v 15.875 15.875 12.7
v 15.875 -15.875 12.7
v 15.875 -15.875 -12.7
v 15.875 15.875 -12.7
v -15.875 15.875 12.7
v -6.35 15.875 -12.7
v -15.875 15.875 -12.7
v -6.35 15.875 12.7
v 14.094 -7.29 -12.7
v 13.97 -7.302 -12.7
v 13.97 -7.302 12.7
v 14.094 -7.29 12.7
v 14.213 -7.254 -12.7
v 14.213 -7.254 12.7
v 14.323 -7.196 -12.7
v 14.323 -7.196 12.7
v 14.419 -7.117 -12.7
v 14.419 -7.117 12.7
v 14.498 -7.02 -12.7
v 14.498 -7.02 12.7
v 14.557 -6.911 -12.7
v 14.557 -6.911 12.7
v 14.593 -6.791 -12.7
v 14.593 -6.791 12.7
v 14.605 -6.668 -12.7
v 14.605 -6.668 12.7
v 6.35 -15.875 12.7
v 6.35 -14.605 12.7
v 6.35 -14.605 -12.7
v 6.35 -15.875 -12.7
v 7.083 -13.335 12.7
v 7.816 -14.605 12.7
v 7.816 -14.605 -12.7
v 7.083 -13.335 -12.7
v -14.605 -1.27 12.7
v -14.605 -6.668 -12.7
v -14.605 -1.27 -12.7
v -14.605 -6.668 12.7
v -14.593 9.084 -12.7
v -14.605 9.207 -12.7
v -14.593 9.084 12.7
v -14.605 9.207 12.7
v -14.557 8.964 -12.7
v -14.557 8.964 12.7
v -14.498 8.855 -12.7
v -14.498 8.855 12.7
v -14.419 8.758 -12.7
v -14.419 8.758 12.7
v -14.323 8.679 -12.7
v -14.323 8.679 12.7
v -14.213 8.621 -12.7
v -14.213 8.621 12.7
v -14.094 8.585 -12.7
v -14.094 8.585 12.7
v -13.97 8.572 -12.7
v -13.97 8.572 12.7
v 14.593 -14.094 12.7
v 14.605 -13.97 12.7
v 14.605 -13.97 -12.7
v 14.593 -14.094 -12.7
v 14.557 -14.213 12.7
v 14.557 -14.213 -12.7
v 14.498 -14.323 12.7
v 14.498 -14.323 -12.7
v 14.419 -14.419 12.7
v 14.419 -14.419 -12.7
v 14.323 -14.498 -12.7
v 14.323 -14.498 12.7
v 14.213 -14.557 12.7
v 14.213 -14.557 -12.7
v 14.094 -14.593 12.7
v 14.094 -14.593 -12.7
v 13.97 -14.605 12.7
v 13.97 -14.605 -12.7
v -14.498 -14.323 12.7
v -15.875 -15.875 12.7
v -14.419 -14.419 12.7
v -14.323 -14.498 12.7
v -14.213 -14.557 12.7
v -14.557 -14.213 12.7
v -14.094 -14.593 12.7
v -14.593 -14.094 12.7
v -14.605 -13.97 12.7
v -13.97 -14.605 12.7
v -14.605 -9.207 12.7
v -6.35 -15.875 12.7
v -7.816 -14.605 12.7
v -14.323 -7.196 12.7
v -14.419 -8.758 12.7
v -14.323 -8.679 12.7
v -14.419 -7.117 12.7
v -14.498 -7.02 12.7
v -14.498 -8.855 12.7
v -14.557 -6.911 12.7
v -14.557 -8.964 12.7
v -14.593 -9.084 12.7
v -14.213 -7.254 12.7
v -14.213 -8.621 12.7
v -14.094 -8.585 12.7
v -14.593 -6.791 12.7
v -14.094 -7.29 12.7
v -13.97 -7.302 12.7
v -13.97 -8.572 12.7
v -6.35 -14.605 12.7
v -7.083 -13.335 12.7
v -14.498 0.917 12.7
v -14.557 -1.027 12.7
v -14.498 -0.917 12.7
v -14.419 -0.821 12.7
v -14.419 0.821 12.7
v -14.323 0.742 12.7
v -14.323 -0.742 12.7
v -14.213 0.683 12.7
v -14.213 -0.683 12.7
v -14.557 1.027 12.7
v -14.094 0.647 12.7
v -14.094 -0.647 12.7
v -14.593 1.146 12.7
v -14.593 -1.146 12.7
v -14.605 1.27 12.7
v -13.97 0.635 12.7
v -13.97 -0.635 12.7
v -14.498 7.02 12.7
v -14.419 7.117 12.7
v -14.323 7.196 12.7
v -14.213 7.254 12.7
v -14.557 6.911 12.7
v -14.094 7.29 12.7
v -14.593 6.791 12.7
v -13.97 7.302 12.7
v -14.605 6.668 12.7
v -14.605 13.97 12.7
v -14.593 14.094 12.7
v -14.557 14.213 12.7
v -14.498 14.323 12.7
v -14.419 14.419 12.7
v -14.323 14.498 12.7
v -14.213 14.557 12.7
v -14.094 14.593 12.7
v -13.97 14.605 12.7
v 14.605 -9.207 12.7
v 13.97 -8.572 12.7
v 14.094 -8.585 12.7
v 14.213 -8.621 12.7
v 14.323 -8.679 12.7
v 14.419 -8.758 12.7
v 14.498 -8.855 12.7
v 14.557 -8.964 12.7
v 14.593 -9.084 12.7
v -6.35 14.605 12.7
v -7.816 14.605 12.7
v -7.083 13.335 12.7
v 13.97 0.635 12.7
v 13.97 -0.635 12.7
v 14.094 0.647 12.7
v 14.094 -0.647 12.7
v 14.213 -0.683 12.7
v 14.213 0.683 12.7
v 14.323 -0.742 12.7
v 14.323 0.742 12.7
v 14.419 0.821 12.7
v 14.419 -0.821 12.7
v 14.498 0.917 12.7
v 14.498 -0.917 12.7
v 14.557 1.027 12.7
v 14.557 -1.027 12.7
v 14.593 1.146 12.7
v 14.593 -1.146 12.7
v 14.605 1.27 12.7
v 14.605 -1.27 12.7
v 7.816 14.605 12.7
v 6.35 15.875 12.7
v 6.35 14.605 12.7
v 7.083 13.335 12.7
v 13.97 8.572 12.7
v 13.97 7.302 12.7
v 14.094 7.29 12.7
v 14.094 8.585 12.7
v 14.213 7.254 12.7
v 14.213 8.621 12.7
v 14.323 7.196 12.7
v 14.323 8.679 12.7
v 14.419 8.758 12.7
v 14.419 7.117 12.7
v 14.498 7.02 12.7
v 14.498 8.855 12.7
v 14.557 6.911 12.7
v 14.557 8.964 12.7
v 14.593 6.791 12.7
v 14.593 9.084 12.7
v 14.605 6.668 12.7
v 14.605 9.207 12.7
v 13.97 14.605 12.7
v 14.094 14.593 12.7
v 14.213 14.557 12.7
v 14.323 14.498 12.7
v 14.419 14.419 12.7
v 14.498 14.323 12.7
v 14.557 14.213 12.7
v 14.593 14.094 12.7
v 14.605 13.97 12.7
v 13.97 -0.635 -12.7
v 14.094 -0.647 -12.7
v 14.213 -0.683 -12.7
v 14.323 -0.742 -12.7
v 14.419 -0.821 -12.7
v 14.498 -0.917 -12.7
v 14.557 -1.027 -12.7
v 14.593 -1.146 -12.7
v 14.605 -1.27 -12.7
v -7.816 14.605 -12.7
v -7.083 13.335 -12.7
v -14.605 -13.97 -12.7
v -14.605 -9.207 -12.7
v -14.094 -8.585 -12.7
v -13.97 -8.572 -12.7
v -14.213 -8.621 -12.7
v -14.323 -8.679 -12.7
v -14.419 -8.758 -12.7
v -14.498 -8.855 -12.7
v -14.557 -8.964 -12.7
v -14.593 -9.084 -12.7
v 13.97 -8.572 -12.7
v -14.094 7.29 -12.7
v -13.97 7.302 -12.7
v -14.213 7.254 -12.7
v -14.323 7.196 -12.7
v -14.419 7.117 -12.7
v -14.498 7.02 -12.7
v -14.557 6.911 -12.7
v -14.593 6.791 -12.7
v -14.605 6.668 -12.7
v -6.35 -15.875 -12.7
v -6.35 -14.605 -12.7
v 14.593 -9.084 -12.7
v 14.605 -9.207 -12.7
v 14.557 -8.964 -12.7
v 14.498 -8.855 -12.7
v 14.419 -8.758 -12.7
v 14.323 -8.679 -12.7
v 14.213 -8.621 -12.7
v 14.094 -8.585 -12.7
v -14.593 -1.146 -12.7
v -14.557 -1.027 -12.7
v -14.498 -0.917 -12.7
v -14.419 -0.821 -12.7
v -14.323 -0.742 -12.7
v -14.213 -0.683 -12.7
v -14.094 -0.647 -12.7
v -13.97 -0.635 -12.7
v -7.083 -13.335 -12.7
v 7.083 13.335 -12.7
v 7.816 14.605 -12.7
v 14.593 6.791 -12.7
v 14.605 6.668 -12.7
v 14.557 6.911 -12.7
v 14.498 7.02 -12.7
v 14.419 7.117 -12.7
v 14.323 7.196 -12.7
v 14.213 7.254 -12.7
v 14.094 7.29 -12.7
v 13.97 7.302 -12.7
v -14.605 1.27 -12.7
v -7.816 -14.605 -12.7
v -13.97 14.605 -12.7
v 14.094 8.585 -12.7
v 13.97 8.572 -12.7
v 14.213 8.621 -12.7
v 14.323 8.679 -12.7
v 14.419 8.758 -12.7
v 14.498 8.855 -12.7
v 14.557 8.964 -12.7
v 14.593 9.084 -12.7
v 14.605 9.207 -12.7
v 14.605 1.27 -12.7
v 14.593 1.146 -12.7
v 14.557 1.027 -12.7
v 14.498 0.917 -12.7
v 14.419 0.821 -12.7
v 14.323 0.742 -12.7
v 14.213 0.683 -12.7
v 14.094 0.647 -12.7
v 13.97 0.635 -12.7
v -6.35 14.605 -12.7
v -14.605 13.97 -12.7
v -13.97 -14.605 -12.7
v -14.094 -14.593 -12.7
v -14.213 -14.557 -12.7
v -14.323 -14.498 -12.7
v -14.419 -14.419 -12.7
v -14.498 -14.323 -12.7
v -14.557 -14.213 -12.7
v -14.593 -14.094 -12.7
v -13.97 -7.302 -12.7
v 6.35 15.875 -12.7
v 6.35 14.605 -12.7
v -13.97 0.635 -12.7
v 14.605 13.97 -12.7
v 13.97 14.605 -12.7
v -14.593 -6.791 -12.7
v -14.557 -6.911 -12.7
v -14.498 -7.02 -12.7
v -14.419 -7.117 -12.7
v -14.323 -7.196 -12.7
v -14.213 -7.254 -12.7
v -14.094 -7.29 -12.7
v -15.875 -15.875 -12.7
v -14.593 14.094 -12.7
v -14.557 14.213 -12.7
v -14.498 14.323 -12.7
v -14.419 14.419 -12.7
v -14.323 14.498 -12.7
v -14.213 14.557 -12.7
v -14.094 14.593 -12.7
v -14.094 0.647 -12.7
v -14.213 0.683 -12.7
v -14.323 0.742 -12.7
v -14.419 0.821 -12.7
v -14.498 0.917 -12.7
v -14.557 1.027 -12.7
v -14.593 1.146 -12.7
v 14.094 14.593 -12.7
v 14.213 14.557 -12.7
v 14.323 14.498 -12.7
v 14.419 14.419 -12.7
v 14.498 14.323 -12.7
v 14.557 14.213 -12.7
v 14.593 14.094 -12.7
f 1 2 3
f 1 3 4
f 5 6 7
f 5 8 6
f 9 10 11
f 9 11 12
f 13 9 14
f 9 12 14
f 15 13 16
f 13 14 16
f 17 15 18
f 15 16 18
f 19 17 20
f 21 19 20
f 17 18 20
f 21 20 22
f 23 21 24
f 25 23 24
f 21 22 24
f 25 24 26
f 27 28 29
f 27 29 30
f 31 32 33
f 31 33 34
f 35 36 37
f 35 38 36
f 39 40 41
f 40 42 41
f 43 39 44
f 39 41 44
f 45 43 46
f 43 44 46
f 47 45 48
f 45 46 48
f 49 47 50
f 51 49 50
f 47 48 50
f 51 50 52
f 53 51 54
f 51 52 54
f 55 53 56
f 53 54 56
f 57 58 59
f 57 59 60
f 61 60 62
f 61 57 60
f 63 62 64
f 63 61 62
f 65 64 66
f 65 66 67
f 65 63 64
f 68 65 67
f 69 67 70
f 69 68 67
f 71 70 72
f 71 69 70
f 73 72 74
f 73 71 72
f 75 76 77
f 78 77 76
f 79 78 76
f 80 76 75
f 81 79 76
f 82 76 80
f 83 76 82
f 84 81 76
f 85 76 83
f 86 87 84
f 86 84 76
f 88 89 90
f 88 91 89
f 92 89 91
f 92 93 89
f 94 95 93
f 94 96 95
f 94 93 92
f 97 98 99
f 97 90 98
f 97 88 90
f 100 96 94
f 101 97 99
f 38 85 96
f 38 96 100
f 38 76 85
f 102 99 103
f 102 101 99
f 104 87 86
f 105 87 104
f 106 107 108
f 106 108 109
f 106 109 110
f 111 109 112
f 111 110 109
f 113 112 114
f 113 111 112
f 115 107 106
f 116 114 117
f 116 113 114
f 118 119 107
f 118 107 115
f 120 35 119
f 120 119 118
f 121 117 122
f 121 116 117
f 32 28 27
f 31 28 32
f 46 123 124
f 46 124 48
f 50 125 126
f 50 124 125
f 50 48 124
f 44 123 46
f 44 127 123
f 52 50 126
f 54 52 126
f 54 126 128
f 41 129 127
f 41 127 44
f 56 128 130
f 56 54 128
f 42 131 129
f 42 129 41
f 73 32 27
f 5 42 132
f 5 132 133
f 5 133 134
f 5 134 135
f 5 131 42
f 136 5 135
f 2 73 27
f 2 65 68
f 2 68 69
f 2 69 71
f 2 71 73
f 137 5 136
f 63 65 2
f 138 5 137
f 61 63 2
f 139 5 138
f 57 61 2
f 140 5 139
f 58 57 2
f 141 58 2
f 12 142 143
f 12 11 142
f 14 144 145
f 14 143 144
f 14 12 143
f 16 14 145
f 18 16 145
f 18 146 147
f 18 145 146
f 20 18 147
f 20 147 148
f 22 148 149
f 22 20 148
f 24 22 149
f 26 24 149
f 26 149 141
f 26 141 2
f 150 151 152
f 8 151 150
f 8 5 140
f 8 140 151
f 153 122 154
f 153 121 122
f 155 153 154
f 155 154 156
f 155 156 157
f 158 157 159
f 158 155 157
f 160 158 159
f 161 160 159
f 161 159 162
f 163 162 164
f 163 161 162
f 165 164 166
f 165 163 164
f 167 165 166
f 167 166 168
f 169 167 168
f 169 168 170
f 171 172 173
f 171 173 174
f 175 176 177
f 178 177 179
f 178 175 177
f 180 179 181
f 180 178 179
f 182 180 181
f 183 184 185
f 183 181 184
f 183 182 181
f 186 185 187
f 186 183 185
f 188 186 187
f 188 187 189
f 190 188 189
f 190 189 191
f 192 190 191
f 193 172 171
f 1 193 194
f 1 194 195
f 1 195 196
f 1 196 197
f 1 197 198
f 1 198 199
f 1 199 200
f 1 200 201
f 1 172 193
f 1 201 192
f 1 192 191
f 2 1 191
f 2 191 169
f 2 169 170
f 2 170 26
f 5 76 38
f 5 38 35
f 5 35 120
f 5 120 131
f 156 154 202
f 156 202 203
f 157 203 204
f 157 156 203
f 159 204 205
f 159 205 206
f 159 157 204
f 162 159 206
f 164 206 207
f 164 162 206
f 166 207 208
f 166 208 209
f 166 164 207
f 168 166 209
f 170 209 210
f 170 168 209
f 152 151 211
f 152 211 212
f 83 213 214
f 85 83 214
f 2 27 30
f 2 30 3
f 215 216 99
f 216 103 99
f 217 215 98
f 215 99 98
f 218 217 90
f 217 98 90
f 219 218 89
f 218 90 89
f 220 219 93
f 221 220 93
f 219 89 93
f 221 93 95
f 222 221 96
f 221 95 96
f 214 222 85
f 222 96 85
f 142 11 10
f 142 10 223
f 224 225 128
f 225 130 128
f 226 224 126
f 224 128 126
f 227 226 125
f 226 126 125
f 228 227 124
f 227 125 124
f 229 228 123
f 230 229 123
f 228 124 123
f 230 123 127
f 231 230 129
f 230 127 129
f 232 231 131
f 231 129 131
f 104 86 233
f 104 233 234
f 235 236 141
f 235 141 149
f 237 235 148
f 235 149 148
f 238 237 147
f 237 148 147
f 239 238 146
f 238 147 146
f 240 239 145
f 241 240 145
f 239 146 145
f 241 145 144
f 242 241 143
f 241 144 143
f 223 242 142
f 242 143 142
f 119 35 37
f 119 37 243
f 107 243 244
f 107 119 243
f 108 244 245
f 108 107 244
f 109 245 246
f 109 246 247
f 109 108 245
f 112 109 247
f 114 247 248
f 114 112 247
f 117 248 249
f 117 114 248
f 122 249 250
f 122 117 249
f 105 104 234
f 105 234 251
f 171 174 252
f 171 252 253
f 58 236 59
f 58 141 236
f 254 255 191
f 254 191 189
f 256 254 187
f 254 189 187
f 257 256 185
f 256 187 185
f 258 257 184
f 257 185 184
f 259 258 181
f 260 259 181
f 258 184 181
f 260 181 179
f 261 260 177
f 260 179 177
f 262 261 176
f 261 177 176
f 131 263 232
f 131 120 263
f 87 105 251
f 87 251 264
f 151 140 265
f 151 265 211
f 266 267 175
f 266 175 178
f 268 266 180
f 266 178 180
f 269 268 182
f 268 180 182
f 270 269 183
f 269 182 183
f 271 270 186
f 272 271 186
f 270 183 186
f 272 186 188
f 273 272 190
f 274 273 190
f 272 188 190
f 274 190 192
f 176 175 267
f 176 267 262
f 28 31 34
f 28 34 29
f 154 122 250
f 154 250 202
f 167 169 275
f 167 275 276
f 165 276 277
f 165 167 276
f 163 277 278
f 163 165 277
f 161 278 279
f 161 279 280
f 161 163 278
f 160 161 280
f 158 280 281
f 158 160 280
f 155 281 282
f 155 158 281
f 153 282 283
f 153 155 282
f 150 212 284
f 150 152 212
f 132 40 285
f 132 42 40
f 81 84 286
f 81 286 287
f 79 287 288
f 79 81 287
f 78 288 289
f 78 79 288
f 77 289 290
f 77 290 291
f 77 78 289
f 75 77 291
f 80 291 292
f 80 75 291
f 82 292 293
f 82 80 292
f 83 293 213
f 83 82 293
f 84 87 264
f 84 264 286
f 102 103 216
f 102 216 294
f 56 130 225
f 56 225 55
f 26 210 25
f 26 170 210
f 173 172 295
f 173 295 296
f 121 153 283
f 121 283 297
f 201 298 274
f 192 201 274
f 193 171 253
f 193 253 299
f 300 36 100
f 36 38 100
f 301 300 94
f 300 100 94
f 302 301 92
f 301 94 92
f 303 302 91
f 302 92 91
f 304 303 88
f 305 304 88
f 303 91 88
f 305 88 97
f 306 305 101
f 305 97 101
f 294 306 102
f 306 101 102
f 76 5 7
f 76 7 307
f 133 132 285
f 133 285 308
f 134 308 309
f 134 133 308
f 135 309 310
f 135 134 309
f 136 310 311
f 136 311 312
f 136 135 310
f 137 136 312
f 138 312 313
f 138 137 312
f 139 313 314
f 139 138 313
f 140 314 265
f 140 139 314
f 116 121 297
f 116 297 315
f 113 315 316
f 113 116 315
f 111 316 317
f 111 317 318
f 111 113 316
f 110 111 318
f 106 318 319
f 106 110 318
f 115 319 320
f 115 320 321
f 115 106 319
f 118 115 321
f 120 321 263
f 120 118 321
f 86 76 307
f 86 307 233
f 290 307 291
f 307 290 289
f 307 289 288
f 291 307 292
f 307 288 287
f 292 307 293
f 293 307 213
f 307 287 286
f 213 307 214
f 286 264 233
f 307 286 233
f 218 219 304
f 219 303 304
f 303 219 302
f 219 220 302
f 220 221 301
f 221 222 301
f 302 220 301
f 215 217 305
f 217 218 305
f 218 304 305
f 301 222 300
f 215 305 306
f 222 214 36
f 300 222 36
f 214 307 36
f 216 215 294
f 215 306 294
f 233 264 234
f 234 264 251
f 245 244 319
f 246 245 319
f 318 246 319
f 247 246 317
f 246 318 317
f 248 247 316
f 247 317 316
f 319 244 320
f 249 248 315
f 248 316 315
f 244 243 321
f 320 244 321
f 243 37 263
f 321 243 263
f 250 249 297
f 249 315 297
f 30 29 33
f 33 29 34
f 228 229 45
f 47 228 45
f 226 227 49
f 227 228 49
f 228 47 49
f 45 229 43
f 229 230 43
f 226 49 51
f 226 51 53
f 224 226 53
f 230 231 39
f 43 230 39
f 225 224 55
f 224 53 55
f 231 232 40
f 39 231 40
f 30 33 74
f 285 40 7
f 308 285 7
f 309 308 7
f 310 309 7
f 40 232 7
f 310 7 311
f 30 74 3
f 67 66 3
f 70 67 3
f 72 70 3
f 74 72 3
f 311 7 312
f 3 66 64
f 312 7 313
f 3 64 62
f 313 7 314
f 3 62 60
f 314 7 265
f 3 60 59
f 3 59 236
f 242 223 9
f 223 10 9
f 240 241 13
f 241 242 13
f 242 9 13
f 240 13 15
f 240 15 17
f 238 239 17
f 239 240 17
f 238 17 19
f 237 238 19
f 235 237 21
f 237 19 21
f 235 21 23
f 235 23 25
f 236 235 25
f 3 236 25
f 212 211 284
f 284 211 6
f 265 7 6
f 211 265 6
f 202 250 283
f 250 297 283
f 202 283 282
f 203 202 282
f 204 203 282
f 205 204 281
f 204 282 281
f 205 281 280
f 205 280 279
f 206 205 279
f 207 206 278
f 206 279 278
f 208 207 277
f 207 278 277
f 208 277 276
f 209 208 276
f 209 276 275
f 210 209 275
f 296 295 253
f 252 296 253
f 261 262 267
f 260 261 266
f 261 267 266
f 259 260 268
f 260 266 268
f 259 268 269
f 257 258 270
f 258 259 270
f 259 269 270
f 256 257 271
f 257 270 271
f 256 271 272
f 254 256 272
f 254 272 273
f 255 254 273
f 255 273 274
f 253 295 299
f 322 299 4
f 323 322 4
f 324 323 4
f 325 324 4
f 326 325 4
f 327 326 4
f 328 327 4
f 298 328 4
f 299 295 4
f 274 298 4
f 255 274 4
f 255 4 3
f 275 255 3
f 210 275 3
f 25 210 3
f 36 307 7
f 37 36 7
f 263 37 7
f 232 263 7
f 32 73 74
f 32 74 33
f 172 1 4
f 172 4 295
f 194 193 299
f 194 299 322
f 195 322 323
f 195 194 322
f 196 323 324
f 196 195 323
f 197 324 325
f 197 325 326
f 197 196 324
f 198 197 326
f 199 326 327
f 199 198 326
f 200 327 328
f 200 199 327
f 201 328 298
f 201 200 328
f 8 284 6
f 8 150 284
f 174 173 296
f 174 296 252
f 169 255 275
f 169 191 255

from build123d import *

# Parameters (mm, degrees)
BASE_EXTRUDE_DEPTH = 12.7
FILLET1_R          = 0.635


with BuildPart() as part:
    # Sketch1 → Base-Extrude (new, symmetric)
    with BuildSketch(Plane.XY):
        with BuildLine():
            Line((-6.35, 15.875), (-15.875, 15.875))
            Line((-15.875, 15.875), (-15.875, -15.875))
            Line((-15.875, -15.875), (-6.35, -15.875))
            Line((-6.35, -15.875), (-6.35, -14.605))
            Line((-6.35, -14.605), (-7.083234843, -13.335))
            Line((-7.083234843, -13.335), (-7.816469684, -14.605))
            Line((-7.816469684, -14.605), (-13.97, -14.605))
            ThreePointArc((-13.97, -14.605), (-14.419012806, -14.419012806), (-14.605, -13.97))
            Line((-14.605, -13.97), (-14.605, -8.5725))
            Line((-14.605, -8.5725), (-13.97, -8.5725))
            Line((-13.97, -8.5725), (-13.97, -7.3025))
            Line((-13.97, -7.3025), (-14.605, -7.3025))
            Line((-14.605, -7.3025), (-14.605, -1.27))
            ThreePointArc((-14.605, -1.27), (-14.419012806, -0.820987194), (-13.97, -0.635))
            Line((-13.97, -0.635), (13.97, -0.635))
            ThreePointArc((13.97, -0.635), (14.419012806, -0.820987194), (14.605, -1.27))
            Line((14.605, -1.27), (14.605, -7.3025))
            Line((14.605, -7.3025), (13.97, -7.3025))
            Line((13.97, -7.3025), (13.97, -8.5725))
            Line((13.97, -8.5725), (14.605, -8.5725))
            Line((14.605, -8.5725), (14.605, -13.97))
            ThreePointArc((14.605, -13.97), (14.419012806, -14.419012806), (13.97, -14.605))
            Line((13.97, -14.605), (7.816469684, -14.605))
            Line((7.816469684, -14.605), (7.083234843, -13.335))
            Line((7.083234843, -13.335), (6.35, -14.605))
            Line((6.35, -14.605), (6.35, -15.875))
            Line((6.35, -15.875), (15.875, -15.875))
            Line((15.875, -15.875), (15.875, 15.875))
            Line((15.875, 15.875), (6.35, 15.875))
            Line((6.35, 15.875), (6.35, 14.605))
            Line((6.35, 14.605), (7.083234843, 13.335))
            Line((7.083234843, 13.335), (7.816469684, 14.605))
            Line((7.816469684, 14.605), (13.97, 14.605))
            ThreePointArc((13.97, 14.605), (14.419012806, 14.419012806), (14.605, 13.97))
            Line((14.605, 13.97), (14.605, 8.5725))
            Line((14.605, 8.5725), (13.97, 8.5725))
            Line((13.97, 8.5725), (13.97, 7.3025))
            Line((13.97, 7.3025), (14.605, 7.3025))
            Line((14.605, 7.3025), (14.605, 1.27))
            ThreePointArc((14.605, 1.27), (14.419012806, 0.820987194), (13.97, 0.635))
            Line((13.97, 0.635), (-13.97, 0.635))
            ThreePointArc((-13.97, 0.635), (-14.419012806, 0.820987194), (-14.605, 1.27))
            Line((-14.605, 1.27), (-14.605, 7.3025))
            Line((-14.605, 7.3025), (-13.97, 7.3025))
            Line((-13.97, 7.3025), (-13.97, 8.5725))
            Line((-13.97, 8.5725), (-14.605, 8.5725))
            Line((-14.605, 8.5725), (-14.605, 13.97))
            ThreePointArc((-14.605, 13.97), (-14.419012806, 14.419012806), (-13.97, 14.605))
            Line((-13.97, 14.605), (-7.816469684, 14.605))
            Line((-7.816469684, 14.605), (-7.083234843, 13.335))
            Line((-7.083234843, 13.335), (-6.35, 14.605))
            Line((-6.35, 14.605), (-6.35, 15.875))
        make_face()
    extrude(amount=BASE_EXTRUDE_DEPTH, both=True)

    # Fillet1
    fillet1_edges = [part.edges().sort_by_distance(p)[0] for p in [
        (14.605, 8.5725, 0),
        (14.605, -7.3025, 0),
        (-14.605, 8.5725, 0),
        (-14.605, -7.3025, 0),
        (-14.605, 7.3025, 0),
        (-14.605, -8.5725, 0),
        (14.605, 7.3025, 0),
        (14.605, -8.5725, 0),
    ]]
    fillet(fillet1_edges, radius=FILLET1_R - 0.0001)  # a hair under: the kernel refuses the full size


solid = part.part
